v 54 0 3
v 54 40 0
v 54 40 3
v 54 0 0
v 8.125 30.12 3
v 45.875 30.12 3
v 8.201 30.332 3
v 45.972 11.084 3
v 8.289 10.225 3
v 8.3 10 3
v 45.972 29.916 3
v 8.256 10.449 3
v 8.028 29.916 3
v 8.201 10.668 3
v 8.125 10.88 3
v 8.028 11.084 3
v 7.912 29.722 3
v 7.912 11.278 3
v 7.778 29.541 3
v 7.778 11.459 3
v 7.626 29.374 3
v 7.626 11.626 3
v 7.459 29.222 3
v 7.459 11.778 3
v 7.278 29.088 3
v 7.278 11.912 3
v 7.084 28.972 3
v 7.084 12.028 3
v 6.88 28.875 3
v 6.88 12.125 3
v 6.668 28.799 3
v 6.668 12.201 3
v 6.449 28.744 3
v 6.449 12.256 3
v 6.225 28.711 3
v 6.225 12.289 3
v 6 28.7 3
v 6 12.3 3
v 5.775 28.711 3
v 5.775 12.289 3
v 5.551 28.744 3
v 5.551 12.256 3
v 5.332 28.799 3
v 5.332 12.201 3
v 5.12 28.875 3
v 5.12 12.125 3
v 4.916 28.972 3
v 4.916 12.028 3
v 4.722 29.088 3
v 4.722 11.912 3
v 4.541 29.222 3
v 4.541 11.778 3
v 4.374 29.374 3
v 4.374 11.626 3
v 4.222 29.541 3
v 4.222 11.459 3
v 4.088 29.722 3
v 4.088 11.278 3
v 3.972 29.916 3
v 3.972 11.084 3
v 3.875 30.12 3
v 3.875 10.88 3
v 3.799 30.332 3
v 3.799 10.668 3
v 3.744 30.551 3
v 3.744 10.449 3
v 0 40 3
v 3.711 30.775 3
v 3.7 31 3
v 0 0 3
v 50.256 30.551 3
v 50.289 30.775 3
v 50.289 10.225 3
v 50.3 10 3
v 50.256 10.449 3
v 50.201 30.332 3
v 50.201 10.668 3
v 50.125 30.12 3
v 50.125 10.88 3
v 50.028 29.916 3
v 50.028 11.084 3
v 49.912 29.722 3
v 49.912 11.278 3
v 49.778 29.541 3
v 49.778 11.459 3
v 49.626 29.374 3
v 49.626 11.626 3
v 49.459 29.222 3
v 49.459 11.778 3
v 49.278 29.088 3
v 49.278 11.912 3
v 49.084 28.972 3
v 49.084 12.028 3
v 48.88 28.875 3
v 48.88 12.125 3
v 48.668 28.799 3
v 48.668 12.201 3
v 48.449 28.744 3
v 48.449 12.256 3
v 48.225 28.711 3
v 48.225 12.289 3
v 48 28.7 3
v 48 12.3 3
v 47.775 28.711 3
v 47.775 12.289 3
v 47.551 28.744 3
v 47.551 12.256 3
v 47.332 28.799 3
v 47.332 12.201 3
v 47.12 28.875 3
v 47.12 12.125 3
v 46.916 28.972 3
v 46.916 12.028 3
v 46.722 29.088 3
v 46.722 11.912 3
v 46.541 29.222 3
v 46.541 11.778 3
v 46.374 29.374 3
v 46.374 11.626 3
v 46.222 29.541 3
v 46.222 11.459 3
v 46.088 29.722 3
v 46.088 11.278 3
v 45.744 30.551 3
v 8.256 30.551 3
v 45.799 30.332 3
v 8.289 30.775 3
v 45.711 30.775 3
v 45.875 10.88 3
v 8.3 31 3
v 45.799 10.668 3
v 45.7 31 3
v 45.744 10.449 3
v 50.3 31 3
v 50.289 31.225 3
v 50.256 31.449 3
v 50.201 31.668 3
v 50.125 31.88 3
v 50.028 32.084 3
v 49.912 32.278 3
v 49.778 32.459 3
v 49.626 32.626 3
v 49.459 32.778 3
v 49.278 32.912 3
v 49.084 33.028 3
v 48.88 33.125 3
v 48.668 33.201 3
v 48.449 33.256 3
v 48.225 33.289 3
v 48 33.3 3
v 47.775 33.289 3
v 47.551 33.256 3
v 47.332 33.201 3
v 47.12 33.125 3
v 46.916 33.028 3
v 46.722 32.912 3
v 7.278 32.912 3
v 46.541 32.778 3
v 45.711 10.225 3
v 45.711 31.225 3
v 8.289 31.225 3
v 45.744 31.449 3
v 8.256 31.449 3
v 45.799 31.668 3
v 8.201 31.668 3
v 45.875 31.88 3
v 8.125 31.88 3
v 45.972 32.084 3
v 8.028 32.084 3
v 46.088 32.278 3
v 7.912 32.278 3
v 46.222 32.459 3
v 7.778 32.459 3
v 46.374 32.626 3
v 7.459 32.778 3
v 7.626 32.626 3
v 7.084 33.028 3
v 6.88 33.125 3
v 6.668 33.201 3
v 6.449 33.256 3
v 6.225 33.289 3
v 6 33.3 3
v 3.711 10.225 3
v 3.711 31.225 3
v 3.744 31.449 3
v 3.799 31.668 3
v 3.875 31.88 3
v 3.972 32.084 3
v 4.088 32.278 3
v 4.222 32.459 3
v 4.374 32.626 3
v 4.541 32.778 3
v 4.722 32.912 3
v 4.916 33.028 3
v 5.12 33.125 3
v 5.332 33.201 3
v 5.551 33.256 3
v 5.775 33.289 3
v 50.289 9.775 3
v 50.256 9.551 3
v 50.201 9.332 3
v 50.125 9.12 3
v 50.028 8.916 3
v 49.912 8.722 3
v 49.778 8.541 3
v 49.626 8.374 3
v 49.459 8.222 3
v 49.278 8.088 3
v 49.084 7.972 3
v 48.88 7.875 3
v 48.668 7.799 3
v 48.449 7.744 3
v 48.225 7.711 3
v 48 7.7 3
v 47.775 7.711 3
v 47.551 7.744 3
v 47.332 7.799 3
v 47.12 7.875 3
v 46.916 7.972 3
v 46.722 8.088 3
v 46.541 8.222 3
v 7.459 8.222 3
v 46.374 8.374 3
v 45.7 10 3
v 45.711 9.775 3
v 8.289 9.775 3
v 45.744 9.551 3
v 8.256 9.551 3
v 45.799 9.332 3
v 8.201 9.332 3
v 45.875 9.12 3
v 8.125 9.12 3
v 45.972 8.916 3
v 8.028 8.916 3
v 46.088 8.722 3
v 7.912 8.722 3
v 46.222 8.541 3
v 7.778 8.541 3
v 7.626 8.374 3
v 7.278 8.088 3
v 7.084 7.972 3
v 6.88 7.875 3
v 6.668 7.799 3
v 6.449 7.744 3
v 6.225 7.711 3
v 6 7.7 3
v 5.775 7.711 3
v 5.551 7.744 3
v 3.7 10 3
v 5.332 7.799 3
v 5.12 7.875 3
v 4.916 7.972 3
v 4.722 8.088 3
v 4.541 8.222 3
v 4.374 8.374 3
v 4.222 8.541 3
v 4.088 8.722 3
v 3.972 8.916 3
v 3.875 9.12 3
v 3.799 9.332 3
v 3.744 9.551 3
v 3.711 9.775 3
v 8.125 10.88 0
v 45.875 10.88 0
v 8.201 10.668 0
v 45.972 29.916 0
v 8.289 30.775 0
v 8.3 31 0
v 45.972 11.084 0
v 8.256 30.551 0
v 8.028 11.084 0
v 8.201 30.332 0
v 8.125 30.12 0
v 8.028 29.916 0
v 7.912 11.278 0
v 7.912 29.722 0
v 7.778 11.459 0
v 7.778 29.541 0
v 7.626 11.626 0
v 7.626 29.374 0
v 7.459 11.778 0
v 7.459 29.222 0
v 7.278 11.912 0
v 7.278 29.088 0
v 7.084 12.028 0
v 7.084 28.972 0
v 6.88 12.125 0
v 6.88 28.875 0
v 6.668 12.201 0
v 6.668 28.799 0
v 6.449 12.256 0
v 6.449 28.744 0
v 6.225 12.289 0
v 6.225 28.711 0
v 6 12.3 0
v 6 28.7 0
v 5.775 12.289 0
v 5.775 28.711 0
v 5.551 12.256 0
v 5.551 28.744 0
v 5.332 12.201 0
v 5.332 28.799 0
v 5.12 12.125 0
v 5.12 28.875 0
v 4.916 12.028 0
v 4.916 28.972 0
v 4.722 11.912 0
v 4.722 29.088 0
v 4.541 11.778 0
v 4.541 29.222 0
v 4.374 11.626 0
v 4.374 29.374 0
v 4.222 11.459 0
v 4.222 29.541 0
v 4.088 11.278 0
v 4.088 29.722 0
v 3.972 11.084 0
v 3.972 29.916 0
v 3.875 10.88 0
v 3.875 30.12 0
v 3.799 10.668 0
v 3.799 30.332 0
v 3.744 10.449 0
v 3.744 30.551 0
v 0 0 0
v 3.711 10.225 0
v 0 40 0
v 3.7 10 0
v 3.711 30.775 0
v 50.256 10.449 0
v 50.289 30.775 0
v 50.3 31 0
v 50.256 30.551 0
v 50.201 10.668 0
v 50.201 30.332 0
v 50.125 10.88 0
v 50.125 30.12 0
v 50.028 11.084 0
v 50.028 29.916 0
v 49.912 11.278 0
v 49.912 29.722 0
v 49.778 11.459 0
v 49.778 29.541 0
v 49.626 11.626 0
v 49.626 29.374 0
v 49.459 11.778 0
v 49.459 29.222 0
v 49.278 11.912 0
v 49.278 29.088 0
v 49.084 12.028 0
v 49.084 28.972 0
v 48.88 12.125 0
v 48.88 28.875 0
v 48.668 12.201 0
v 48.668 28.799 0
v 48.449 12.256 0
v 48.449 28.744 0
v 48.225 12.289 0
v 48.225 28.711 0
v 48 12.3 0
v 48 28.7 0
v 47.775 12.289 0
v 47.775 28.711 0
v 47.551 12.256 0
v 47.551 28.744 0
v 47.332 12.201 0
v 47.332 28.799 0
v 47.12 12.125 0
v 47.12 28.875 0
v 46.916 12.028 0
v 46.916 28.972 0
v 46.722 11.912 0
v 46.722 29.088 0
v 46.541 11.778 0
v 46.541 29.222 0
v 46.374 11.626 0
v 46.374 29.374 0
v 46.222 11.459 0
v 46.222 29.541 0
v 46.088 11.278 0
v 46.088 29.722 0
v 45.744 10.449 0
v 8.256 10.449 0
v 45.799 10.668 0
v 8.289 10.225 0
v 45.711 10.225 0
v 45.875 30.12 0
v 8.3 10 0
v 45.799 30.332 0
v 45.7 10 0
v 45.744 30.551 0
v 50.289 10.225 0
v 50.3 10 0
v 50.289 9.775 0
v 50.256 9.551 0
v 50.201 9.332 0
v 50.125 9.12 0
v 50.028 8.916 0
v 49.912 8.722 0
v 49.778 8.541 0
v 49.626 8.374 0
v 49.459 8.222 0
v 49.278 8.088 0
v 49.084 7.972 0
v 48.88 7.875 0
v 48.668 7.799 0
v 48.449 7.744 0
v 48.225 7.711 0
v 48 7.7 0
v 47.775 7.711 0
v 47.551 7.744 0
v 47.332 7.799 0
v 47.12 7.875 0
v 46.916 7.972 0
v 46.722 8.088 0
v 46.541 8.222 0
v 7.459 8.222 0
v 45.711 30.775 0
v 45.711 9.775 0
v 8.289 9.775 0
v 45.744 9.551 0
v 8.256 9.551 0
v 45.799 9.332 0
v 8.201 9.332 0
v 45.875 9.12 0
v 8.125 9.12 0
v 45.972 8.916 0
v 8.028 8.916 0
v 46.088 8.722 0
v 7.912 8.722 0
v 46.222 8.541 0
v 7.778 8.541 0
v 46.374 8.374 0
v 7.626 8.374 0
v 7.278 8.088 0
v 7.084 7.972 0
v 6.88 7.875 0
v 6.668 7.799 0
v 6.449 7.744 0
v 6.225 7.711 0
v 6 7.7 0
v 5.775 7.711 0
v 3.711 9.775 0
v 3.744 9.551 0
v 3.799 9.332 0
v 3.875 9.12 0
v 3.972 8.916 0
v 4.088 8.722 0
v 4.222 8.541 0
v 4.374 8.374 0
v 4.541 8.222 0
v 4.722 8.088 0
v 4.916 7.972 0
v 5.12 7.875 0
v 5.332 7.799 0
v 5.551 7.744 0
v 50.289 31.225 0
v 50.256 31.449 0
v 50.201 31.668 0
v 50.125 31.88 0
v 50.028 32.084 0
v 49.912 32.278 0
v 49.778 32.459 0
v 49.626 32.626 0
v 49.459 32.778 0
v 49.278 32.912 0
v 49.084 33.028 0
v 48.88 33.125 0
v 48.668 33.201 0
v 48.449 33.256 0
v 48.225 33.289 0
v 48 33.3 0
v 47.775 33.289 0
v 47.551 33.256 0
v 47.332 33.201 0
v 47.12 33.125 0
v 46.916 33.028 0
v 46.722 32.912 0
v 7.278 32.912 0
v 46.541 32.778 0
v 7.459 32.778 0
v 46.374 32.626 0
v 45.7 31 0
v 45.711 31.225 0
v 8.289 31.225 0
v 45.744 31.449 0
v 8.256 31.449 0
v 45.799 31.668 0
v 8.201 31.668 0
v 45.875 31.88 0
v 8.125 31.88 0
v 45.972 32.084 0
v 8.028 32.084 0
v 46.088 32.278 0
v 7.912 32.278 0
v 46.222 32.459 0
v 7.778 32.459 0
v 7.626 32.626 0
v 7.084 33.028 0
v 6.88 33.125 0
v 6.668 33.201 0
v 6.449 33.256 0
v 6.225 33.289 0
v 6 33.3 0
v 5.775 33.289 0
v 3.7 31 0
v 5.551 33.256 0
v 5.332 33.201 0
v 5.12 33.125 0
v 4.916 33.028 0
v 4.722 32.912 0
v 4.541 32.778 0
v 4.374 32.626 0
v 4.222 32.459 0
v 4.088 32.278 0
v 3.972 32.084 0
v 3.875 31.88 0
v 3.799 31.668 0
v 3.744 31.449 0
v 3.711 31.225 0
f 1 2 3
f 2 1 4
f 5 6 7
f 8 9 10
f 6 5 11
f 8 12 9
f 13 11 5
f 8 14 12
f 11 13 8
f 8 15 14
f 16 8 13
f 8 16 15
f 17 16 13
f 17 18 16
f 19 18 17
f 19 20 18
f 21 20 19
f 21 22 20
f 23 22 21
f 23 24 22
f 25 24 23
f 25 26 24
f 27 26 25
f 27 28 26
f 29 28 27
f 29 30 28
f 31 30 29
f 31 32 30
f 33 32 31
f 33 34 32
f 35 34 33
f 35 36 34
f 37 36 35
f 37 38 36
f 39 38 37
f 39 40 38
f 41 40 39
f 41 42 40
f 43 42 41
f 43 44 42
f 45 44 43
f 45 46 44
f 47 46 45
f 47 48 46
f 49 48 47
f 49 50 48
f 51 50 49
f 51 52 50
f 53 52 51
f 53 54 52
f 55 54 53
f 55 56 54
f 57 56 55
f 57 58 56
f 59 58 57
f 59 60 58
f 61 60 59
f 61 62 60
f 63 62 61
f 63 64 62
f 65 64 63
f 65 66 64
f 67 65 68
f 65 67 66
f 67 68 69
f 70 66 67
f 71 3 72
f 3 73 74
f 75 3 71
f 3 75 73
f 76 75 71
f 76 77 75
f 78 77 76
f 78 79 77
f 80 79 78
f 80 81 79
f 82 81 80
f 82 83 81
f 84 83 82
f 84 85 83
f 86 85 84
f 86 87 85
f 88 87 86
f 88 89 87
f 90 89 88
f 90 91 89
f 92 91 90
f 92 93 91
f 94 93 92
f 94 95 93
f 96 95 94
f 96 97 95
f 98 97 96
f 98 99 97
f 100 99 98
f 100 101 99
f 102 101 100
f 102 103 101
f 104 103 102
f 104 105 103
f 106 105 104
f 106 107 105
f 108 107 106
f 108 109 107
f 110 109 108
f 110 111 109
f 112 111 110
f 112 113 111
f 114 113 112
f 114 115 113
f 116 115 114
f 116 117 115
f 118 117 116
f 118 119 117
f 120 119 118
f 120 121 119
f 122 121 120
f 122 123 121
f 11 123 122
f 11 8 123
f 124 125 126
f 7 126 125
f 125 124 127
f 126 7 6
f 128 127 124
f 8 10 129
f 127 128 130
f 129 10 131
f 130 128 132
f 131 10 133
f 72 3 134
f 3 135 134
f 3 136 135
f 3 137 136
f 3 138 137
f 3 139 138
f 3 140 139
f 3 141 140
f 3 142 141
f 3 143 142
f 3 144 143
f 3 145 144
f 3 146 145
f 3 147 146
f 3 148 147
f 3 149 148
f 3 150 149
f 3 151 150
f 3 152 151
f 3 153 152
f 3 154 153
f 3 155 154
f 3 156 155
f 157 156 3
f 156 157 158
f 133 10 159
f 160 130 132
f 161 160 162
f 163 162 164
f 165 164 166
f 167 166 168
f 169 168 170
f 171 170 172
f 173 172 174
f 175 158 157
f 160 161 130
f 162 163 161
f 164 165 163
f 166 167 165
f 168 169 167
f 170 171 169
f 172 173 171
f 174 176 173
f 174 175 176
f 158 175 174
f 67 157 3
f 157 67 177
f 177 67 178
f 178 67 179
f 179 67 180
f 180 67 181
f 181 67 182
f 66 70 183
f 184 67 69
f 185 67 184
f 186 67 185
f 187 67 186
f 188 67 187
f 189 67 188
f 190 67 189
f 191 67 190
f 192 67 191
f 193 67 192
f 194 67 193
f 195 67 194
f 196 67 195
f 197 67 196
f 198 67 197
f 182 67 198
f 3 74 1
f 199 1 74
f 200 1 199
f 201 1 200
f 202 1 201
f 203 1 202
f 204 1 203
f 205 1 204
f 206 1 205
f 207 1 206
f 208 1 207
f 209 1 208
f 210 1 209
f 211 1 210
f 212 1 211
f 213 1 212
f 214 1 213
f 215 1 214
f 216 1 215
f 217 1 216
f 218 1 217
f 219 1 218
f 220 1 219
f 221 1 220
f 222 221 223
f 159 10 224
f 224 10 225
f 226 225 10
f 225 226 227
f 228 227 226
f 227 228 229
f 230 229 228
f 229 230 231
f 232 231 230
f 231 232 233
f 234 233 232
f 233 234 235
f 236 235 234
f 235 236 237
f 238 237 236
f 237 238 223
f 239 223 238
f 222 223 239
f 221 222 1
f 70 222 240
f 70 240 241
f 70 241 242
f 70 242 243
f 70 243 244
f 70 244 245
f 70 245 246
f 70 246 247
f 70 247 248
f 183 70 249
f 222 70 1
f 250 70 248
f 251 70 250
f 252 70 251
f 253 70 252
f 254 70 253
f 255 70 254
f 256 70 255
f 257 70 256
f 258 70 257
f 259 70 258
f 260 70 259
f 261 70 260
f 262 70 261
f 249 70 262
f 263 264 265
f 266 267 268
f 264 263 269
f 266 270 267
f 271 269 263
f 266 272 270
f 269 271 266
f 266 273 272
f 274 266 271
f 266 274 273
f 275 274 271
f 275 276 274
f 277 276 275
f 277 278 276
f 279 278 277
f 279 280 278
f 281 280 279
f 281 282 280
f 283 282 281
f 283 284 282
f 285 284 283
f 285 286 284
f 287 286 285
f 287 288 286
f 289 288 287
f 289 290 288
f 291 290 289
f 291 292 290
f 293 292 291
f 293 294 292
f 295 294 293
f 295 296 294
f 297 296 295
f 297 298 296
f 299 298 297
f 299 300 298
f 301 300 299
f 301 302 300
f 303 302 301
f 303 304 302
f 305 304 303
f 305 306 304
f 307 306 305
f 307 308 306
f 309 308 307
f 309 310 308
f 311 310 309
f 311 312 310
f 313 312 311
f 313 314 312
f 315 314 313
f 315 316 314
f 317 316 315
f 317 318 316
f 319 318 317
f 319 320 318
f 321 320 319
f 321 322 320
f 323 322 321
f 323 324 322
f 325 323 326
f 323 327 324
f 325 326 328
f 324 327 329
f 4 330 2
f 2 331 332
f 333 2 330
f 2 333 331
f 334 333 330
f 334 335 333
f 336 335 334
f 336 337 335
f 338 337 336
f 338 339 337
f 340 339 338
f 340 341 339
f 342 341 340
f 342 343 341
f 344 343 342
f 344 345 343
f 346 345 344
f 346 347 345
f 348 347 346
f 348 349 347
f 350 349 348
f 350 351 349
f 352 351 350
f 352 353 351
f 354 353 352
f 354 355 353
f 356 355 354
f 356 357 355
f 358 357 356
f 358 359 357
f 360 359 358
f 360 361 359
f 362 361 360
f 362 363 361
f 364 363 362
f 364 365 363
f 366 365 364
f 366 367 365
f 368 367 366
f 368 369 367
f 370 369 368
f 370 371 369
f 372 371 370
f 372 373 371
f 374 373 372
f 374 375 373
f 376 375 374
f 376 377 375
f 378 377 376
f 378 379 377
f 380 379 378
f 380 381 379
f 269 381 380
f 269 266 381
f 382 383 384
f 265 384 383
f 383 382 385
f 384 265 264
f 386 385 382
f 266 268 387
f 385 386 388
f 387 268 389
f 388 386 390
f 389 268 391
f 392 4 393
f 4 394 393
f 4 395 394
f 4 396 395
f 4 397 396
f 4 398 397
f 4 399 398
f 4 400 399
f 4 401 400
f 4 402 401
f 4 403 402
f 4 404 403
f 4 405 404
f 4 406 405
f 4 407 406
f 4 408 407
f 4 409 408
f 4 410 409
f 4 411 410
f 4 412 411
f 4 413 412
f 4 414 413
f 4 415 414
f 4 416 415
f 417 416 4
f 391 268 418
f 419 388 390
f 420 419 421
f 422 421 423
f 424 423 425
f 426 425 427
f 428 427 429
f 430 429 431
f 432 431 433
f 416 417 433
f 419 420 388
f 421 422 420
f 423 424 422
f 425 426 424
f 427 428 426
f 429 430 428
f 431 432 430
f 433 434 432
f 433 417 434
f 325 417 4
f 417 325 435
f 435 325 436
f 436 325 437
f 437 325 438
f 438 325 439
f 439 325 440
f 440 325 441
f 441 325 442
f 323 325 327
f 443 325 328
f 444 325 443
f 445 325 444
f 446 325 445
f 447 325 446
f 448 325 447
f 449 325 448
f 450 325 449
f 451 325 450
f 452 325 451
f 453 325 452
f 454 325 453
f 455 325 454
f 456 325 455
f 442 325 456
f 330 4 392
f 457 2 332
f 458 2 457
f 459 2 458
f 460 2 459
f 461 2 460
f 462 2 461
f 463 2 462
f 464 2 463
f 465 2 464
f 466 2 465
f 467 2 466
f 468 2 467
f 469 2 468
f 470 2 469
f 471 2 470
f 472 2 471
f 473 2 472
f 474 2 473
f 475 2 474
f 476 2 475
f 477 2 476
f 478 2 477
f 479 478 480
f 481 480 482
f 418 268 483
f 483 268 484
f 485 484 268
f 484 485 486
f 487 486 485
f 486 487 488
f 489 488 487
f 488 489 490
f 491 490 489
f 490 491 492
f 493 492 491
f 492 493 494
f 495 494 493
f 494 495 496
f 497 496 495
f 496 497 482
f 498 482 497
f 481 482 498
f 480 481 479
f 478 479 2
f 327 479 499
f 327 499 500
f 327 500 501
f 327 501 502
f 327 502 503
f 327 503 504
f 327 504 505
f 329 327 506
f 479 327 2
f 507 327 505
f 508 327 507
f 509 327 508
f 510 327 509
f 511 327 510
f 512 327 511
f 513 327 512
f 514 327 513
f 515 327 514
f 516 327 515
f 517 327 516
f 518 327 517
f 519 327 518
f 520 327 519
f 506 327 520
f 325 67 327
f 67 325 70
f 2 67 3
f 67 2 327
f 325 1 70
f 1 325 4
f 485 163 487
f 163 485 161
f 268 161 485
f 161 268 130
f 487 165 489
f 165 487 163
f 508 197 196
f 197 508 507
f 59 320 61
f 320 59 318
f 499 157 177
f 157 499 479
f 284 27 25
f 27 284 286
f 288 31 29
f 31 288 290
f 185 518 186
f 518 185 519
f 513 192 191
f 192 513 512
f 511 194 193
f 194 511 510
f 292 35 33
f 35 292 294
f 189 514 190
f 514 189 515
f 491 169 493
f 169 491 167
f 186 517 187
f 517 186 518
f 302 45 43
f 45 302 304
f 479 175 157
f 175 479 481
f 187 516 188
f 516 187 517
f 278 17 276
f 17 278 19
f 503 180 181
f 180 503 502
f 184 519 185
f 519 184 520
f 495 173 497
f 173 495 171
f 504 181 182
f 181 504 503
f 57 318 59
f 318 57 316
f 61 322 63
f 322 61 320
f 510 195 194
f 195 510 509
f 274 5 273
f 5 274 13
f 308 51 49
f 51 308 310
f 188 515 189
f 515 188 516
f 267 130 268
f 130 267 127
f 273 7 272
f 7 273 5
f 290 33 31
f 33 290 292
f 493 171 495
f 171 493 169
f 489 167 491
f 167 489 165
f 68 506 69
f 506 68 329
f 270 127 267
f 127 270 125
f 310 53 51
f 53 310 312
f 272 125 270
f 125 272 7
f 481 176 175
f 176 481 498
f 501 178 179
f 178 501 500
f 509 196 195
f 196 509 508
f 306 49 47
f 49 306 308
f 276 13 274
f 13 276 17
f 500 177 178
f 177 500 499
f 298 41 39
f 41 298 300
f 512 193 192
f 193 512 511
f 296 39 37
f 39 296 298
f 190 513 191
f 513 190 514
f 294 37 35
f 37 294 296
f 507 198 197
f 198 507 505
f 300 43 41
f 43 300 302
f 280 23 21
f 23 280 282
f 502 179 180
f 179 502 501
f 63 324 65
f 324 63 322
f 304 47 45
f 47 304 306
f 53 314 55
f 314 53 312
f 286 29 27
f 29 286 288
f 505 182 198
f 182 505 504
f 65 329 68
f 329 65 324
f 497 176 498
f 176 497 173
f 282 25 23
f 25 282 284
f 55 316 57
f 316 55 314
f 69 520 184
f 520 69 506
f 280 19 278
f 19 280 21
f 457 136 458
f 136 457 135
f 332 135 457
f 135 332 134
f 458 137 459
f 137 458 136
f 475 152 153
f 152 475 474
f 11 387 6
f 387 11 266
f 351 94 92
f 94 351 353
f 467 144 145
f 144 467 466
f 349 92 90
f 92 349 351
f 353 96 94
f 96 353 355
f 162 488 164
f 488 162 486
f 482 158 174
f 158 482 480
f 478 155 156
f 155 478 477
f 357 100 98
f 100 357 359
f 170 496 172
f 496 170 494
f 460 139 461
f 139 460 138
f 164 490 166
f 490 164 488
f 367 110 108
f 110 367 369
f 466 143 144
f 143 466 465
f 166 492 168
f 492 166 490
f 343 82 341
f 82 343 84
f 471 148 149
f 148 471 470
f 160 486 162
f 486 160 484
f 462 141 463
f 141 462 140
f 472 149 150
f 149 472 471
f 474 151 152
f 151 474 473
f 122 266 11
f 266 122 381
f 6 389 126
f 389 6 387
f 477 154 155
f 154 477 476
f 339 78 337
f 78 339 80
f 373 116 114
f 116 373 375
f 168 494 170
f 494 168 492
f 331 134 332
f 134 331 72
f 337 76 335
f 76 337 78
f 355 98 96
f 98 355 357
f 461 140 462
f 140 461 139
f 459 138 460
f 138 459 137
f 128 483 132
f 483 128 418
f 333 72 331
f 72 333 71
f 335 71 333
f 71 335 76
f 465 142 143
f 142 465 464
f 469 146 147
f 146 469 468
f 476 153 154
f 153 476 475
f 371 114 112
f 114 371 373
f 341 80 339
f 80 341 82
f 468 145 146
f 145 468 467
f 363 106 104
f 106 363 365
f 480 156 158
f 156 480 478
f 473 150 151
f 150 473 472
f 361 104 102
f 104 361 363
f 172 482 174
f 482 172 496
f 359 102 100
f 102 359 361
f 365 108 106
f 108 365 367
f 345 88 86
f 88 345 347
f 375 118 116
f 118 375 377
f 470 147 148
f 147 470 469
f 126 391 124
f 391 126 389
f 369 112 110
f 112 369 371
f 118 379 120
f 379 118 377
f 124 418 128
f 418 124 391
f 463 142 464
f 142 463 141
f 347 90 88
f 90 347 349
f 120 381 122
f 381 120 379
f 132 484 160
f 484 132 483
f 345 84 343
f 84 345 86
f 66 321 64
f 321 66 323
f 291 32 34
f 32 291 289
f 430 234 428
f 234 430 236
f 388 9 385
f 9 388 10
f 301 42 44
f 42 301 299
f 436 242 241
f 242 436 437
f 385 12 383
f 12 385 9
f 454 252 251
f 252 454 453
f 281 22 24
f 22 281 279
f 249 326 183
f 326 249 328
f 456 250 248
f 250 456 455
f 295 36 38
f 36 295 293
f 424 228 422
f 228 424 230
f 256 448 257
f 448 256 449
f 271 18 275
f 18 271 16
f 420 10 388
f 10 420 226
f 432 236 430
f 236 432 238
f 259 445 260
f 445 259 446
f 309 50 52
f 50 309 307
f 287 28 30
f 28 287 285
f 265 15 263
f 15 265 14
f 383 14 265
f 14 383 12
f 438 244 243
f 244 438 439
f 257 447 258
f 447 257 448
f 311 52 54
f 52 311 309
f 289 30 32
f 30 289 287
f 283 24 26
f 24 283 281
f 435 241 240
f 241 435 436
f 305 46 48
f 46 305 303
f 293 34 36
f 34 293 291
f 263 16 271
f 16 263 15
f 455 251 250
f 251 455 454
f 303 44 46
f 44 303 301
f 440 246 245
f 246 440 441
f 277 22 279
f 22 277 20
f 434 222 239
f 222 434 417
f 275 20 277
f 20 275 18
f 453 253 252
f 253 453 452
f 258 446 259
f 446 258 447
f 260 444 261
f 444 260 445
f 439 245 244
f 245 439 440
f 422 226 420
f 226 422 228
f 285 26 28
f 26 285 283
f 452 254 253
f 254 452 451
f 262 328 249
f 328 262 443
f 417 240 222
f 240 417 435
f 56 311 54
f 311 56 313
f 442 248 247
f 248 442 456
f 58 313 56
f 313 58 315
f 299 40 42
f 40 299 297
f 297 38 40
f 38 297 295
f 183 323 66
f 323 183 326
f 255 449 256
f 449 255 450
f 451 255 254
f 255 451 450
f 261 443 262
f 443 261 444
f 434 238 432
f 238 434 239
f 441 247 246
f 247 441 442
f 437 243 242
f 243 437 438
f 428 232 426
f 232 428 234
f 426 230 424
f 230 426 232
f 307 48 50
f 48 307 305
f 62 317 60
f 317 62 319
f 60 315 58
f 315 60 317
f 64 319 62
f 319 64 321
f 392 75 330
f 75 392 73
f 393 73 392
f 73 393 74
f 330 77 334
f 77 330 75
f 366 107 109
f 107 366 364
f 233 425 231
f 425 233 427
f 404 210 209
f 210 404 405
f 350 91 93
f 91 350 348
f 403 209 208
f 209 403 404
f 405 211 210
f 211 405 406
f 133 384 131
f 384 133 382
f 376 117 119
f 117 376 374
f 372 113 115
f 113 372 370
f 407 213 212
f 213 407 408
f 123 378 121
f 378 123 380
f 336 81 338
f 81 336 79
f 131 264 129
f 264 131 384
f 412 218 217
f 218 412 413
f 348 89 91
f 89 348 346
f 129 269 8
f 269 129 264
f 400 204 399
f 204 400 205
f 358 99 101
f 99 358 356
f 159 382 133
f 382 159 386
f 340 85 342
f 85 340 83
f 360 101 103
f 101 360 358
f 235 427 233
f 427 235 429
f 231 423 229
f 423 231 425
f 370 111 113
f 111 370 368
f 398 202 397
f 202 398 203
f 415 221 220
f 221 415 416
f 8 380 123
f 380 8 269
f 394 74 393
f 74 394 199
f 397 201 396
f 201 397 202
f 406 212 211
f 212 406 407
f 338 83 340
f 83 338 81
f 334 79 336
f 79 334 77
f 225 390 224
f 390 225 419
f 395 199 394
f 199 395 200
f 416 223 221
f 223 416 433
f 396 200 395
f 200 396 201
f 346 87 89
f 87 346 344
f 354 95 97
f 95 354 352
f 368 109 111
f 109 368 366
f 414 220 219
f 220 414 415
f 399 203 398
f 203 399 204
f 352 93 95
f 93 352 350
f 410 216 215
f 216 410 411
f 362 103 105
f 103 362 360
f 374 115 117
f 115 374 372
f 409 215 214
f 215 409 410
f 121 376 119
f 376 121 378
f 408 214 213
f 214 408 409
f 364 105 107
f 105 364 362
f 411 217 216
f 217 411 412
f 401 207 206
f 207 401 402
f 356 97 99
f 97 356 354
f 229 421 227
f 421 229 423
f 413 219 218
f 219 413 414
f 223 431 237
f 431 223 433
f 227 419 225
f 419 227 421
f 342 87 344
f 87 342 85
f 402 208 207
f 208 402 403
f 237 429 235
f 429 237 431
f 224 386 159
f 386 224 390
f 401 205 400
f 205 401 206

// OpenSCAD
$fn=64;
difference(){
cube([54,40,3]);
translate([6,31,-1])
cylinder(d=4.6,h=5);
translate([48,31,-1])
cylinder(d=4.6,h=5);
	
	translate([6,10,-1])
cylinder(d=4.6,h=5);
translate([48,10,-1])
cylinder(d=4.6,h=5);
	
}
